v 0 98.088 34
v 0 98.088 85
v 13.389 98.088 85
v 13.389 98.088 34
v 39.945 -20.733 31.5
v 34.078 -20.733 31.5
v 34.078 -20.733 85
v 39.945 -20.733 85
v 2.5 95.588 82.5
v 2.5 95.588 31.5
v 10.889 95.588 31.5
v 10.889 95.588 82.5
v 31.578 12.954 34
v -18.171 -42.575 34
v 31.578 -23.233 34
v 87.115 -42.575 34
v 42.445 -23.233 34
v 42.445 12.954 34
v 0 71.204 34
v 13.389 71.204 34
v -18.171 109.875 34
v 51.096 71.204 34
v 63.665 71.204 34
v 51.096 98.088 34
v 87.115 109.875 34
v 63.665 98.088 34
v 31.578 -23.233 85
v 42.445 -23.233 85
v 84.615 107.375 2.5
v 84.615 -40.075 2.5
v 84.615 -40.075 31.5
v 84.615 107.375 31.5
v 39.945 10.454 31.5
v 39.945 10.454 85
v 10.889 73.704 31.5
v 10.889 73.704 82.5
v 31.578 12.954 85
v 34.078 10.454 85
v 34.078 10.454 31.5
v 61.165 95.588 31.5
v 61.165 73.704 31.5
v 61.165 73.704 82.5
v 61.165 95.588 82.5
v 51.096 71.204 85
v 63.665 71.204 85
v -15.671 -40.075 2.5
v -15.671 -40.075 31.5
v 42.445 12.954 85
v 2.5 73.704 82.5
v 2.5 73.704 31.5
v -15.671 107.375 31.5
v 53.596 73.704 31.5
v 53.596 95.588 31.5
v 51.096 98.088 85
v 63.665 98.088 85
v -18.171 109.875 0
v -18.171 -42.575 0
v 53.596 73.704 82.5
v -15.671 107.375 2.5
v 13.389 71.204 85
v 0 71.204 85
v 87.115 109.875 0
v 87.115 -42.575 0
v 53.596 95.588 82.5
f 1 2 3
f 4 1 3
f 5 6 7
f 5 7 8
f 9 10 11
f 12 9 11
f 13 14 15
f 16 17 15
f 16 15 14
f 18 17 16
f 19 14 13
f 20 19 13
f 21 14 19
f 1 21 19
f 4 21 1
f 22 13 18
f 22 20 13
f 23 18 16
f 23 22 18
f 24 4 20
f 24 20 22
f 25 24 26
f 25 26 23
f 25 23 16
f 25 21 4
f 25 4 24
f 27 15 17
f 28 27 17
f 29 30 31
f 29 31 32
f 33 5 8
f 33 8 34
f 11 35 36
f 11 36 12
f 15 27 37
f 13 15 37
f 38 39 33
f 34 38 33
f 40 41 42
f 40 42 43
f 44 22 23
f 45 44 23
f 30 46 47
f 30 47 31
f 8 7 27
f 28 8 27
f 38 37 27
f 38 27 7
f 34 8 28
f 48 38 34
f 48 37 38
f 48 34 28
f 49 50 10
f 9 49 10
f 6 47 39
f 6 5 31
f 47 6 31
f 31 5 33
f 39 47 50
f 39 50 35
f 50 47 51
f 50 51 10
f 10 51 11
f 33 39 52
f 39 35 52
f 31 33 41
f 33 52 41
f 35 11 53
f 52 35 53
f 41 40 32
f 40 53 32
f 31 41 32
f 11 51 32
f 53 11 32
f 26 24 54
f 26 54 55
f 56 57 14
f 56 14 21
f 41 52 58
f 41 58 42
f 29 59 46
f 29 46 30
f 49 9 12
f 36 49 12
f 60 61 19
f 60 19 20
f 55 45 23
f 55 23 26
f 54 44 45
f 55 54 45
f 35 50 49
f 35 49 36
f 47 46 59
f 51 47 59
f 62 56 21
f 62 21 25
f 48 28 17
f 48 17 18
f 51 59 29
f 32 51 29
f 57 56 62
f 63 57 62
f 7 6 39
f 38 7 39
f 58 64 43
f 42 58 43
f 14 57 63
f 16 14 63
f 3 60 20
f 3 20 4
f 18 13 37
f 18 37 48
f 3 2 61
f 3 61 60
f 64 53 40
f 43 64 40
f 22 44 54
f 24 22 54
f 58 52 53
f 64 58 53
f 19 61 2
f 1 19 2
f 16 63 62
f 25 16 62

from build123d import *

# Parameters (mm, degrees)
F0_W     = 105.2859798074
F0_H     = 152.4502895772
F1_DEPTH = 34
F2_W     = 13.3893657476
F2_H     = 26.8833786249
F2_W_2   = 12.5688500702
F2_W_3   = 10.8668655157
F2_H_2   = 36.1870983616
F3_DEPTH = 51
F4_T     = -2.5


with BuildPart() as f1:
    # F0 (on Top) → F1 (new body)
    with BuildSketch(Plane.XY):
        with Locations((34.4720818102, 33.6500052363)):
            Rectangle(F0_W, F0_H)
    extrude(amount=F1_DEPTH)

    # F2 (on face) → F3 (join)
    with BuildSketch(Plane.XY.offset(34)):
        with Locations((6.6946828738, 84.6460089087)):
            Rectangle(F2_W, F2_H)
        with Locations((57.3803391308, 84.6460089087)):
            Rectangle(F2_W_2, F2_H)
        with Locations((37.0119139552, -5.1396149211)):
            Rectangle(F2_W_3, F2_H_2)
    extrude(amount=F3_DEPTH)

    # F4
    f4_openings = [f1.faces().sort_by_distance(p)[0] for p in [
        (37.011914, -5.139615, 85),
    ]]
    offset(amount=F4_T, openings=f4_openings, kind=Kind.INTERSECTION)


solid = f1.part
